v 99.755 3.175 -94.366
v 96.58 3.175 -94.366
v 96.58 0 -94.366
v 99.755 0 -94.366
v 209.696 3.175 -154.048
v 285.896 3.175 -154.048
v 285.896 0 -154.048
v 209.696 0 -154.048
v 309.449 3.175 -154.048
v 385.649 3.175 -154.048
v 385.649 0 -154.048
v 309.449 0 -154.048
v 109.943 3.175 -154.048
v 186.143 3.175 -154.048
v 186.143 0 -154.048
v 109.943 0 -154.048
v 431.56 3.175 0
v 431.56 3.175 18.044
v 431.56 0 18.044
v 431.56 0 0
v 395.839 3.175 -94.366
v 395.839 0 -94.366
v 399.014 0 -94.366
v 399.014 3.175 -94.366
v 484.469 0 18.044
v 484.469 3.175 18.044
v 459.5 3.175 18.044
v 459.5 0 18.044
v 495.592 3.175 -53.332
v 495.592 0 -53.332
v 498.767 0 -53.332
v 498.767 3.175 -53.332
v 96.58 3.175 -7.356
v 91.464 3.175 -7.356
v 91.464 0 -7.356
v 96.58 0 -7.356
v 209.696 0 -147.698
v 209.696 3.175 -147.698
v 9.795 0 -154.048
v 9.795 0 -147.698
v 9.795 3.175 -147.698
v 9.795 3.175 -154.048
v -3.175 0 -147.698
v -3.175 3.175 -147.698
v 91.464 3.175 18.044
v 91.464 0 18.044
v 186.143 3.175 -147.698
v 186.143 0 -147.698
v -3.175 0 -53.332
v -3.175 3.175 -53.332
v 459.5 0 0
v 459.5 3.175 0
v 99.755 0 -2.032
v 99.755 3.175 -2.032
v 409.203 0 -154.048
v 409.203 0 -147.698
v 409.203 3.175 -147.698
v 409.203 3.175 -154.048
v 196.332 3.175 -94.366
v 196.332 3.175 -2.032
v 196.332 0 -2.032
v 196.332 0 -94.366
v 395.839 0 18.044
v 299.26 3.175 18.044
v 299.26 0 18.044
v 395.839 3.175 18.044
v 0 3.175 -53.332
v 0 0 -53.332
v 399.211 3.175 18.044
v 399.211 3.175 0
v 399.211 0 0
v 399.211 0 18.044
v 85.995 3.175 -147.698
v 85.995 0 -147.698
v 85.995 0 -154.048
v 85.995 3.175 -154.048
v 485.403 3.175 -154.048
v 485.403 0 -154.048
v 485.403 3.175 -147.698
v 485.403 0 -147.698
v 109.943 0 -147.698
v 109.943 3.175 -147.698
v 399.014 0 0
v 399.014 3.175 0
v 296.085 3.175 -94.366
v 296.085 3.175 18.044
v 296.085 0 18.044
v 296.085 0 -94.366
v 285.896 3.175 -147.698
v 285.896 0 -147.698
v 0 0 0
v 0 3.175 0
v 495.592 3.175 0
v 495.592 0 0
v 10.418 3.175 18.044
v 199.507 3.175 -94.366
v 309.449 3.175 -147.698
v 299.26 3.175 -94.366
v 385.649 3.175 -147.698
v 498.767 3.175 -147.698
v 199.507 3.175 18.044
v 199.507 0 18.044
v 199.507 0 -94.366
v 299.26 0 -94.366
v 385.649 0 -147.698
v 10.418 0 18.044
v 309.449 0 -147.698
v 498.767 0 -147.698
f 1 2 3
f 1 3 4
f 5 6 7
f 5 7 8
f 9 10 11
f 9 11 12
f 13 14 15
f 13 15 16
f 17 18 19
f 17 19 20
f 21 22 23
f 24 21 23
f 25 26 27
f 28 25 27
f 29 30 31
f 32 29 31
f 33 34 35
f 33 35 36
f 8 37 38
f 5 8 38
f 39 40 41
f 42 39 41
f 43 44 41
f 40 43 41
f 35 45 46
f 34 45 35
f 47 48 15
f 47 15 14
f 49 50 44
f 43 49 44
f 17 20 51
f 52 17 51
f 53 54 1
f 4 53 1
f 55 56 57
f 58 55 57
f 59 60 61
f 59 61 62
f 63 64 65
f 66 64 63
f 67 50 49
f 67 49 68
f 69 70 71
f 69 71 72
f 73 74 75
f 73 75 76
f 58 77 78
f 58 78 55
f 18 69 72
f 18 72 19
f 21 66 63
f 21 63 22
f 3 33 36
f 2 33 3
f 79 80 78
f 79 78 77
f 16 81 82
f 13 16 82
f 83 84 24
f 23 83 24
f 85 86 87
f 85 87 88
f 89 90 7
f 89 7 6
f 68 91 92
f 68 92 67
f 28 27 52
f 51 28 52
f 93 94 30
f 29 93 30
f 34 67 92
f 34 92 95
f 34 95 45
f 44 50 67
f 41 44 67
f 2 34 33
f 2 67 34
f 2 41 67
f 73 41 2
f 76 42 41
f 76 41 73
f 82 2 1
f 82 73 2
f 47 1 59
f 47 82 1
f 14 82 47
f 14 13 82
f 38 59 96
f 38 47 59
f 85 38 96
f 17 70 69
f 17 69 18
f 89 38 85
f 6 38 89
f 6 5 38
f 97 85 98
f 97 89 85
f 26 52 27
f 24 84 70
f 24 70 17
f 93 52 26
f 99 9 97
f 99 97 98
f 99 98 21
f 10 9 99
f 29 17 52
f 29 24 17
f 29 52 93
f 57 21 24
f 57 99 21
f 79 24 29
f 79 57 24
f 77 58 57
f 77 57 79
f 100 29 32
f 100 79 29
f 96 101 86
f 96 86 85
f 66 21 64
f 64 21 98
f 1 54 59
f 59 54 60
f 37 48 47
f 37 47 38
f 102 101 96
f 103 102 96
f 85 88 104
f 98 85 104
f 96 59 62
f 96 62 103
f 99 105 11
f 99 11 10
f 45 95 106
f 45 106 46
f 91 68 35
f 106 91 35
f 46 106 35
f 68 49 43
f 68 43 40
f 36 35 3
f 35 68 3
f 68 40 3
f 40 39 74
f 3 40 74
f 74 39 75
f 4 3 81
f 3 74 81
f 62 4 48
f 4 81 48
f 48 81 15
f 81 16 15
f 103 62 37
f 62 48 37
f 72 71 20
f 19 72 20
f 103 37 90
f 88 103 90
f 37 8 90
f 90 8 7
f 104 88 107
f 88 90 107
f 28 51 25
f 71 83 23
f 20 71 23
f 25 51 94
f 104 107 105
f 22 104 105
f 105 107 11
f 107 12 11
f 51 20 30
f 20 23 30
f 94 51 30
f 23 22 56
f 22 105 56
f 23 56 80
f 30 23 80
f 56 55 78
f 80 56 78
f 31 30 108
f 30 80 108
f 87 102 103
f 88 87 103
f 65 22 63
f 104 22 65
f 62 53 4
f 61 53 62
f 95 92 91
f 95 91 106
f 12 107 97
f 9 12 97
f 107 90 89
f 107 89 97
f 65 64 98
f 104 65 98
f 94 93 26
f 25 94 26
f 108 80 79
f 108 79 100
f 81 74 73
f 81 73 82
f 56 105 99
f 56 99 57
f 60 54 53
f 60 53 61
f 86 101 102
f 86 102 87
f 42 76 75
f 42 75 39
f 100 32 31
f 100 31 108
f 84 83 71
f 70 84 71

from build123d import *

# Parameters (mm, degrees)
SKETCH1_W           = 495.5921
SKETCH1_H           = 147.69846
BOSS_EXTRUDE1_DEPTH = 3.175
SKETCH2_W           = 76.2
SKETCH2_H           = 3.175
BOSS_EXTRUDE2_DEPTH = 6.35
SKETCH3_W           = 3.175
SKETCH3_H           = 188.73216
CUT_EXTRUDE1_DEPTH  = 3.175
SKETCH4_W           = 3.175
SKETCH4_H           = 94.36608
BOSS_EXTRUDE3_DEPTH = 3.175
SKETCH5_W           = 96.57842
SKETCH5_H           = 18.04416
BOSS_EXTRUDE4_DEPTH = 3.175
SKETCH6_W           = 96.577155917
SKETCH6_H           = 2.032
CUT_EXTRUDE2_DEPTH  = 523.024547982
SKETCH7_W           = 6.603370135
SKETCH7_H           = 28.867559882
CUT_EXTRUDE3_DEPTH  = 523.024547982


with BuildPart() as part:
    # Sketch1 → Boss-Extrude1 (new body)
    with BuildSketch(Plane(origin=(0, 0, 0), x_dir=(1, 0, 0), z_dir=(0, 1, 0))):
        with Locations((247.79605, 73.84923)):
            Rectangle(SKETCH1_W, SKETCH1_H)
    extrude(amount=BOSS_EXTRUDE1_DEPTH)

    # Sketch2 → Boss-Extrude2 (add)
    with BuildSketch(Plane(origin=(0, 0, -147.69846), x_dir=(-1, 0, 0), z_dir=(0, 0, -1))):
        with Locations((-447.30289, 1.5875)):
            Rectangle(SKETCH2_W, SKETCH2_H)
        with Locations((-347.54947, 1.5875)):
            Rectangle(SKETCH2_W, SKETCH2_H)
        with Locations((-247.79605, 1.5875)):
            Rectangle(SKETCH2_W, SKETCH2_H)
        with Locations((-148.04263, 1.5875)):
            Rectangle(SKETCH2_W, SKETCH2_H)
        with Locations((-47.895498166, 1.5875)):
            Rectangle(SKETCH2_W, SKETCH2_H)
    extrude(amount=BOSS_EXTRUDE2_DEPTH)

    # Sketch3 → Cut-Extrude1 (cut)
    with BuildSketch(Plane(origin=(0, 3.175, 0), x_dir=(1, 0, 0), z_dir=(0, 1, 0))):
        with Locations((397.42618, 0)):
            Rectangle(SKETCH3_W, SKETCH3_H)
        with Locations((297.67276, 0)):
            Rectangle(SKETCH3_W, SKETCH3_H)
        with Locations((197.91934, 0)):
            Rectangle(SKETCH3_W, SKETCH3_H)
        with Locations((98.167184083, 0)):
            Rectangle(SKETCH3_W, SKETCH3_H)
    extrude(amount=-CUT_EXTRUDE1_DEPTH, mode=Mode.SUBTRACT)

    # Sketch4 → Boss-Extrude3 (add, through all)
    with BuildSketch(Plane(origin=(0, 3.175, 0), x_dir=(1, 0, 0), z_dir=(0, 1, 0))):
        with Locations((-1.5875, 100.51542)):
            Rectangle(SKETCH4_W, SKETCH4_H)
        with Locations((497.1796, 100.51542)):
            Rectangle(SKETCH4_W, SKETCH4_H)
    extrude(amount=-BOSS_EXTRUDE3_DEPTH)

    # Sketch5 → Boss-Extrude4 (add, through all)
    with BuildSketch(Plane(origin=(0, 3.175, 0), x_dir=(1, 0, 0), z_dir=(0, 1, 0))):
        with Locations((247.79605, -9.02208)):
            Rectangle(SKETCH5_W, SKETCH5_H)
        with Locations((347.54947, -9.02208)):
            Rectangle(SKETCH5_W, SKETCH5_H)
        Polygon((429.9839, -18.04416), (431.560448611, -18.04416), (431.560448611, 0), (423.633900075, 0), (399.210535917, 0), (399.210535917, -18.04416), align=None)
        Polygon((495.5921, 0), (484.468648611, -18.04416), (459.500448611, -18.04416), (459.500448611, 0), (484.468648611, 0), align=None)
        Polygon((0, 0), (10.417800633, -18.04416), (96.579684083, -18.04416), (96.579684083, 0), align=None)
    extrude(amount=-BOSS_EXTRUDE4_DEPTH)

    # Sketch6 → Cut-Extrude2 (cut, through all)
    with BuildSketch(Plane(origin=(0, 3.175, 0), x_dir=(1, 0, 0), z_dir=(0, 1, 0))):
        with Locations((148.043262041, 1.016)):
            Rectangle(SKETCH6_W, SKETCH6_H)
    extrude(amount=-CUT_EXTRUDE2_DEPTH, mode=Mode.SUBTRACT)

    # Sketch7 → Cut-Extrude3 (cut, through all)
    with BuildSketch(Plane(origin=(0, 3.175, 0), x_dir=(1, 0, 0), z_dir=(0, 1, 0))):
        with Locations((94.765629101, -7.077939941)):
            Rectangle(SKETCH7_W, SKETCH7_H)
    extrude(amount=-CUT_EXTRUDE3_DEPTH, mode=Mode.SUBTRACT)


solid = part.part
